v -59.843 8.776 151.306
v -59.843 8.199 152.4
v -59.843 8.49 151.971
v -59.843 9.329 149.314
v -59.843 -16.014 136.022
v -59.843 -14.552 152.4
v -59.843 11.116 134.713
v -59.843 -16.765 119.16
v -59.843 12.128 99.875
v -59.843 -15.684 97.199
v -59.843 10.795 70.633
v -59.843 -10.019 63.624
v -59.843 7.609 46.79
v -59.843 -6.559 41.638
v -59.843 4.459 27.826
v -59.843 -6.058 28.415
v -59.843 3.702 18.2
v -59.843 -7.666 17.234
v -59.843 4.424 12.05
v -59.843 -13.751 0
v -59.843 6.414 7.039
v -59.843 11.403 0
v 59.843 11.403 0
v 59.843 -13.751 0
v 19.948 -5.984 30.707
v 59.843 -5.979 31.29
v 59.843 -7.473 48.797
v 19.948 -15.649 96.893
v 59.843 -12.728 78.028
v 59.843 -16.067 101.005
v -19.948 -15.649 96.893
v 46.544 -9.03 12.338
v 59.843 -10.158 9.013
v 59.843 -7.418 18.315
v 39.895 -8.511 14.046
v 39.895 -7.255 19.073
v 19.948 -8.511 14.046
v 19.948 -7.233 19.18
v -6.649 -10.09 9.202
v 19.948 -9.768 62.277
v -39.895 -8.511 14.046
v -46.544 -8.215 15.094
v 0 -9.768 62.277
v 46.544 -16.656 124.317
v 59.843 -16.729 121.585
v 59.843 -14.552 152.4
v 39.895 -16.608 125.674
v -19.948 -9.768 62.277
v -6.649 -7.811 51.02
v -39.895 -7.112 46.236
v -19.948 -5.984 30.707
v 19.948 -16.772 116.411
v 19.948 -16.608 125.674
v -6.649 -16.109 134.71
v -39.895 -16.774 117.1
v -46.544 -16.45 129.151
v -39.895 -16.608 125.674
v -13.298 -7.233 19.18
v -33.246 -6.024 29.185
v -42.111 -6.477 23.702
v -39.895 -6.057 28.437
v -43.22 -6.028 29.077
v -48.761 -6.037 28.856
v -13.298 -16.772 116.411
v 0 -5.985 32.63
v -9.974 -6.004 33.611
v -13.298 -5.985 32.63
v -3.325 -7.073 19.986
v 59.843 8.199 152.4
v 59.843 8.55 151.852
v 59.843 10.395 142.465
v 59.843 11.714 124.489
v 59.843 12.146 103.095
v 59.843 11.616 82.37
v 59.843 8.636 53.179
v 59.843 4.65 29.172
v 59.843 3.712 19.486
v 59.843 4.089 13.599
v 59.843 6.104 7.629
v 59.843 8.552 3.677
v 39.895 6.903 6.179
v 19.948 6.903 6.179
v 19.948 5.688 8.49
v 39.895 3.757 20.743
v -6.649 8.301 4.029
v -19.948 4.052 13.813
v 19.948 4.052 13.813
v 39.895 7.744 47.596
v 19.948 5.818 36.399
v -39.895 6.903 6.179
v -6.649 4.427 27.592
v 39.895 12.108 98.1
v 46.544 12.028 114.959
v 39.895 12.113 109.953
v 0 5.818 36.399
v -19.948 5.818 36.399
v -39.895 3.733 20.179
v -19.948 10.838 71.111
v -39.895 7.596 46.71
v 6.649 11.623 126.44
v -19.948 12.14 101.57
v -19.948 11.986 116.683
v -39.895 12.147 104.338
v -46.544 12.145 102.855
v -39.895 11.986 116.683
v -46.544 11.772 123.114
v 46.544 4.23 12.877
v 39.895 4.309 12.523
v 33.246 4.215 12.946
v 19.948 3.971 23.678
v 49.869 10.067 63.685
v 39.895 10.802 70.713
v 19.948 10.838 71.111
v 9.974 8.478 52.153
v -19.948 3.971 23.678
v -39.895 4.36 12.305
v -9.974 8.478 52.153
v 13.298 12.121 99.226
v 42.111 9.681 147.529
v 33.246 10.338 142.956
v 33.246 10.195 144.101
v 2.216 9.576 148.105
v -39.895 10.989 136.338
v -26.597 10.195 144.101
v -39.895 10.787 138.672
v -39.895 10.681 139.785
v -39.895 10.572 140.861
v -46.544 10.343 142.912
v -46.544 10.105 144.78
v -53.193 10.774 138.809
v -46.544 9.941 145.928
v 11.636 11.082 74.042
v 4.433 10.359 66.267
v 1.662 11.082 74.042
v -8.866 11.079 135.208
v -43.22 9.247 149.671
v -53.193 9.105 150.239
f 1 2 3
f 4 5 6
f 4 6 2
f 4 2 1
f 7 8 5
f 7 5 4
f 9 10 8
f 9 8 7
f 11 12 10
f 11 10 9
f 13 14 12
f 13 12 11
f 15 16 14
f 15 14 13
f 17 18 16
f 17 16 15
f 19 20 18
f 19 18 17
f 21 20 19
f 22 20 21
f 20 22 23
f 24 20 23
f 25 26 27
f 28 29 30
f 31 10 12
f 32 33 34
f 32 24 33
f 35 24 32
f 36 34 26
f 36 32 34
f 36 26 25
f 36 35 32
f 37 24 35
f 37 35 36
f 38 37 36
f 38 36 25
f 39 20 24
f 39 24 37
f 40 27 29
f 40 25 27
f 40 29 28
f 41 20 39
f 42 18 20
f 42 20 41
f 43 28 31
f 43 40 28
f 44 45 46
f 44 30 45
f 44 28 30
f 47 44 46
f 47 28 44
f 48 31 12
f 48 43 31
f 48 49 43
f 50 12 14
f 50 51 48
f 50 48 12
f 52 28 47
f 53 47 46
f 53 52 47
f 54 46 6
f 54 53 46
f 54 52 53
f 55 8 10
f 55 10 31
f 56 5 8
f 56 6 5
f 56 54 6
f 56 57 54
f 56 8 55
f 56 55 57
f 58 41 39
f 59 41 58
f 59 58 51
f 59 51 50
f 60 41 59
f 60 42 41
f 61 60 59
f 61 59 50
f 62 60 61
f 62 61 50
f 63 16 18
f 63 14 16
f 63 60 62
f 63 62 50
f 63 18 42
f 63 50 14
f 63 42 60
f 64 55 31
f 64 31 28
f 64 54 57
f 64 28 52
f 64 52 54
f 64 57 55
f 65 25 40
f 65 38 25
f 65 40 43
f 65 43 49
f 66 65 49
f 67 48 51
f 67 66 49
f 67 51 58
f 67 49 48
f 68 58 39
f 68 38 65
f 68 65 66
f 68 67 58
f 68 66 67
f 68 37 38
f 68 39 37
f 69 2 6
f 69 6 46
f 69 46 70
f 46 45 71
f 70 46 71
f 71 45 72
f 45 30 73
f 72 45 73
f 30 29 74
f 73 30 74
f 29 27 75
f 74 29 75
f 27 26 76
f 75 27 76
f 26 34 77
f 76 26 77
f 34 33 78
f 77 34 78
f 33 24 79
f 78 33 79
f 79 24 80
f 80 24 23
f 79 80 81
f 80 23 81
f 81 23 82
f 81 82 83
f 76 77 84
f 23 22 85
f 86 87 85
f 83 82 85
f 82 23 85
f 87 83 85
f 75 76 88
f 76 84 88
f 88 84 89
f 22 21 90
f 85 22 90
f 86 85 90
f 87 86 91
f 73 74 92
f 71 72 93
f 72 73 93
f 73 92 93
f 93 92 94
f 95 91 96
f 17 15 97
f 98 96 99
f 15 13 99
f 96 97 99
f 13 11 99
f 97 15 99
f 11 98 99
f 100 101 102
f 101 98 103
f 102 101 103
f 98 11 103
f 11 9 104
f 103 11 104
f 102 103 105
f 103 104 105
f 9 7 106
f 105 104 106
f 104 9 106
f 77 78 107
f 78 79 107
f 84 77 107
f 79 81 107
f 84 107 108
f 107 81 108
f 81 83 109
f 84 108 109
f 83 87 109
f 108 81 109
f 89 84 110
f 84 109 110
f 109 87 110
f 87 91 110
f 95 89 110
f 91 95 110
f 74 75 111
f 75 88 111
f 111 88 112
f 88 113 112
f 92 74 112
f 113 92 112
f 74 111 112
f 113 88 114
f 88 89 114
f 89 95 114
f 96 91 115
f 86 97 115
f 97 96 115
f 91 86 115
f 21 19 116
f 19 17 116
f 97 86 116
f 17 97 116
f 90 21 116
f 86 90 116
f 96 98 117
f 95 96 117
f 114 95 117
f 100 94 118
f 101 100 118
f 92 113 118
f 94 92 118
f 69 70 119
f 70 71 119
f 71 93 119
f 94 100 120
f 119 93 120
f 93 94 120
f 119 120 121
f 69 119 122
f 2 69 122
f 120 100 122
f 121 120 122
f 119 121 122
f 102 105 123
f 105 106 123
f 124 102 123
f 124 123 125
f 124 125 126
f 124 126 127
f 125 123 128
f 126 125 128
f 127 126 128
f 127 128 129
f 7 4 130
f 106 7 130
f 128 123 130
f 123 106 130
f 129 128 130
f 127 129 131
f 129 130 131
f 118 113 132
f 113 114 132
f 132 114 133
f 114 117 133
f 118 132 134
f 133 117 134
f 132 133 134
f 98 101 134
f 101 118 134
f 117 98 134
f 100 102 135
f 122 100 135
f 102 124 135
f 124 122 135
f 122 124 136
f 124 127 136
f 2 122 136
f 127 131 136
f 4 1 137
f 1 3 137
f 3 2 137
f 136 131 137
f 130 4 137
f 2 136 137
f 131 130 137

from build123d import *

# Parameters (mm, degrees)
F0_W     = 119.6851581335
F0_H     = 46.7431806028
F1_DEPTH = 152.4
F3_DEPTH = 152.4
F5_DEPTH = 127


with BuildPart() as f1:
    # F0 (on Top) → F1 (new body)
    with BuildSketch(Plane.XY):
        Rectangle(F0_W, F0_H)
    extrude(amount=F1_DEPTH)

    # F2 (on face) → F3 (cut)
    with BuildSketch(Plane(origin=(-59.8425790668, 0, 0), x_dir=(0, -1, 0), z_dir=(-1, 0, 0))):
        with BuildLine():
            Line((-23.3715903014, 0), (-11.4030716941, 0))
            add(Edge.make_bspline(
                [(-11.4030716941, 0), (-8.2195056197, 3.9575459118), (1.0774152211, 15.5147086053), (-15.7760282892, 65.5599234309), (-11.3382883726, 149.0952490281), (-8.1989020109, 152.4)],
                knots=[0, 0, 0, 0, 0.1828483227, 0.5339692479, 0.9508432341, 0.9508432341, 0.9508432341, 0.9508432341], degree=3))
            Line((-8.1989020109, 152.4), (-23.3715903014, 152.4))
            Line((-23.3715903014, 152.4), (-23.3715903014, 0))
        make_face()
    extrude(amount=-F3_DEPTH, mode=Mode.SUBTRACT)

    # F4 (on face) → F5 (cut)
    with BuildSketch(Plane(origin=(-59.8425790668, 0, 0), x_dir=(0, -1, 0), z_dir=(-1, 0, 0))):
        with BuildLine():
            add(Edge.make_bspline(
                [(13.7510914356, 0), (9.9562259511, 9.073109189), (0.6466963295, 31.3311784411), (19.8352582333, 97.9170297401), (16.25745163, 134.8114001188), (14.5518090576, 152.4)],
                knots=[0, 0, 0, 0, 0.2647515324, 0.6494860604, 1, 1, 1, 1], degree=3))
            Line((13.7510914356, 0), (23.3715903014, 0))
            Line((23.3715903014, 0), (23.3715903014, 152.4))
            Line((23.3715903014, 152.4), (14.5518090576, 152.4))
        make_face()
    extrude(amount=-F5_DEPTH, mode=Mode.SUBTRACT)


solid = f1.part
